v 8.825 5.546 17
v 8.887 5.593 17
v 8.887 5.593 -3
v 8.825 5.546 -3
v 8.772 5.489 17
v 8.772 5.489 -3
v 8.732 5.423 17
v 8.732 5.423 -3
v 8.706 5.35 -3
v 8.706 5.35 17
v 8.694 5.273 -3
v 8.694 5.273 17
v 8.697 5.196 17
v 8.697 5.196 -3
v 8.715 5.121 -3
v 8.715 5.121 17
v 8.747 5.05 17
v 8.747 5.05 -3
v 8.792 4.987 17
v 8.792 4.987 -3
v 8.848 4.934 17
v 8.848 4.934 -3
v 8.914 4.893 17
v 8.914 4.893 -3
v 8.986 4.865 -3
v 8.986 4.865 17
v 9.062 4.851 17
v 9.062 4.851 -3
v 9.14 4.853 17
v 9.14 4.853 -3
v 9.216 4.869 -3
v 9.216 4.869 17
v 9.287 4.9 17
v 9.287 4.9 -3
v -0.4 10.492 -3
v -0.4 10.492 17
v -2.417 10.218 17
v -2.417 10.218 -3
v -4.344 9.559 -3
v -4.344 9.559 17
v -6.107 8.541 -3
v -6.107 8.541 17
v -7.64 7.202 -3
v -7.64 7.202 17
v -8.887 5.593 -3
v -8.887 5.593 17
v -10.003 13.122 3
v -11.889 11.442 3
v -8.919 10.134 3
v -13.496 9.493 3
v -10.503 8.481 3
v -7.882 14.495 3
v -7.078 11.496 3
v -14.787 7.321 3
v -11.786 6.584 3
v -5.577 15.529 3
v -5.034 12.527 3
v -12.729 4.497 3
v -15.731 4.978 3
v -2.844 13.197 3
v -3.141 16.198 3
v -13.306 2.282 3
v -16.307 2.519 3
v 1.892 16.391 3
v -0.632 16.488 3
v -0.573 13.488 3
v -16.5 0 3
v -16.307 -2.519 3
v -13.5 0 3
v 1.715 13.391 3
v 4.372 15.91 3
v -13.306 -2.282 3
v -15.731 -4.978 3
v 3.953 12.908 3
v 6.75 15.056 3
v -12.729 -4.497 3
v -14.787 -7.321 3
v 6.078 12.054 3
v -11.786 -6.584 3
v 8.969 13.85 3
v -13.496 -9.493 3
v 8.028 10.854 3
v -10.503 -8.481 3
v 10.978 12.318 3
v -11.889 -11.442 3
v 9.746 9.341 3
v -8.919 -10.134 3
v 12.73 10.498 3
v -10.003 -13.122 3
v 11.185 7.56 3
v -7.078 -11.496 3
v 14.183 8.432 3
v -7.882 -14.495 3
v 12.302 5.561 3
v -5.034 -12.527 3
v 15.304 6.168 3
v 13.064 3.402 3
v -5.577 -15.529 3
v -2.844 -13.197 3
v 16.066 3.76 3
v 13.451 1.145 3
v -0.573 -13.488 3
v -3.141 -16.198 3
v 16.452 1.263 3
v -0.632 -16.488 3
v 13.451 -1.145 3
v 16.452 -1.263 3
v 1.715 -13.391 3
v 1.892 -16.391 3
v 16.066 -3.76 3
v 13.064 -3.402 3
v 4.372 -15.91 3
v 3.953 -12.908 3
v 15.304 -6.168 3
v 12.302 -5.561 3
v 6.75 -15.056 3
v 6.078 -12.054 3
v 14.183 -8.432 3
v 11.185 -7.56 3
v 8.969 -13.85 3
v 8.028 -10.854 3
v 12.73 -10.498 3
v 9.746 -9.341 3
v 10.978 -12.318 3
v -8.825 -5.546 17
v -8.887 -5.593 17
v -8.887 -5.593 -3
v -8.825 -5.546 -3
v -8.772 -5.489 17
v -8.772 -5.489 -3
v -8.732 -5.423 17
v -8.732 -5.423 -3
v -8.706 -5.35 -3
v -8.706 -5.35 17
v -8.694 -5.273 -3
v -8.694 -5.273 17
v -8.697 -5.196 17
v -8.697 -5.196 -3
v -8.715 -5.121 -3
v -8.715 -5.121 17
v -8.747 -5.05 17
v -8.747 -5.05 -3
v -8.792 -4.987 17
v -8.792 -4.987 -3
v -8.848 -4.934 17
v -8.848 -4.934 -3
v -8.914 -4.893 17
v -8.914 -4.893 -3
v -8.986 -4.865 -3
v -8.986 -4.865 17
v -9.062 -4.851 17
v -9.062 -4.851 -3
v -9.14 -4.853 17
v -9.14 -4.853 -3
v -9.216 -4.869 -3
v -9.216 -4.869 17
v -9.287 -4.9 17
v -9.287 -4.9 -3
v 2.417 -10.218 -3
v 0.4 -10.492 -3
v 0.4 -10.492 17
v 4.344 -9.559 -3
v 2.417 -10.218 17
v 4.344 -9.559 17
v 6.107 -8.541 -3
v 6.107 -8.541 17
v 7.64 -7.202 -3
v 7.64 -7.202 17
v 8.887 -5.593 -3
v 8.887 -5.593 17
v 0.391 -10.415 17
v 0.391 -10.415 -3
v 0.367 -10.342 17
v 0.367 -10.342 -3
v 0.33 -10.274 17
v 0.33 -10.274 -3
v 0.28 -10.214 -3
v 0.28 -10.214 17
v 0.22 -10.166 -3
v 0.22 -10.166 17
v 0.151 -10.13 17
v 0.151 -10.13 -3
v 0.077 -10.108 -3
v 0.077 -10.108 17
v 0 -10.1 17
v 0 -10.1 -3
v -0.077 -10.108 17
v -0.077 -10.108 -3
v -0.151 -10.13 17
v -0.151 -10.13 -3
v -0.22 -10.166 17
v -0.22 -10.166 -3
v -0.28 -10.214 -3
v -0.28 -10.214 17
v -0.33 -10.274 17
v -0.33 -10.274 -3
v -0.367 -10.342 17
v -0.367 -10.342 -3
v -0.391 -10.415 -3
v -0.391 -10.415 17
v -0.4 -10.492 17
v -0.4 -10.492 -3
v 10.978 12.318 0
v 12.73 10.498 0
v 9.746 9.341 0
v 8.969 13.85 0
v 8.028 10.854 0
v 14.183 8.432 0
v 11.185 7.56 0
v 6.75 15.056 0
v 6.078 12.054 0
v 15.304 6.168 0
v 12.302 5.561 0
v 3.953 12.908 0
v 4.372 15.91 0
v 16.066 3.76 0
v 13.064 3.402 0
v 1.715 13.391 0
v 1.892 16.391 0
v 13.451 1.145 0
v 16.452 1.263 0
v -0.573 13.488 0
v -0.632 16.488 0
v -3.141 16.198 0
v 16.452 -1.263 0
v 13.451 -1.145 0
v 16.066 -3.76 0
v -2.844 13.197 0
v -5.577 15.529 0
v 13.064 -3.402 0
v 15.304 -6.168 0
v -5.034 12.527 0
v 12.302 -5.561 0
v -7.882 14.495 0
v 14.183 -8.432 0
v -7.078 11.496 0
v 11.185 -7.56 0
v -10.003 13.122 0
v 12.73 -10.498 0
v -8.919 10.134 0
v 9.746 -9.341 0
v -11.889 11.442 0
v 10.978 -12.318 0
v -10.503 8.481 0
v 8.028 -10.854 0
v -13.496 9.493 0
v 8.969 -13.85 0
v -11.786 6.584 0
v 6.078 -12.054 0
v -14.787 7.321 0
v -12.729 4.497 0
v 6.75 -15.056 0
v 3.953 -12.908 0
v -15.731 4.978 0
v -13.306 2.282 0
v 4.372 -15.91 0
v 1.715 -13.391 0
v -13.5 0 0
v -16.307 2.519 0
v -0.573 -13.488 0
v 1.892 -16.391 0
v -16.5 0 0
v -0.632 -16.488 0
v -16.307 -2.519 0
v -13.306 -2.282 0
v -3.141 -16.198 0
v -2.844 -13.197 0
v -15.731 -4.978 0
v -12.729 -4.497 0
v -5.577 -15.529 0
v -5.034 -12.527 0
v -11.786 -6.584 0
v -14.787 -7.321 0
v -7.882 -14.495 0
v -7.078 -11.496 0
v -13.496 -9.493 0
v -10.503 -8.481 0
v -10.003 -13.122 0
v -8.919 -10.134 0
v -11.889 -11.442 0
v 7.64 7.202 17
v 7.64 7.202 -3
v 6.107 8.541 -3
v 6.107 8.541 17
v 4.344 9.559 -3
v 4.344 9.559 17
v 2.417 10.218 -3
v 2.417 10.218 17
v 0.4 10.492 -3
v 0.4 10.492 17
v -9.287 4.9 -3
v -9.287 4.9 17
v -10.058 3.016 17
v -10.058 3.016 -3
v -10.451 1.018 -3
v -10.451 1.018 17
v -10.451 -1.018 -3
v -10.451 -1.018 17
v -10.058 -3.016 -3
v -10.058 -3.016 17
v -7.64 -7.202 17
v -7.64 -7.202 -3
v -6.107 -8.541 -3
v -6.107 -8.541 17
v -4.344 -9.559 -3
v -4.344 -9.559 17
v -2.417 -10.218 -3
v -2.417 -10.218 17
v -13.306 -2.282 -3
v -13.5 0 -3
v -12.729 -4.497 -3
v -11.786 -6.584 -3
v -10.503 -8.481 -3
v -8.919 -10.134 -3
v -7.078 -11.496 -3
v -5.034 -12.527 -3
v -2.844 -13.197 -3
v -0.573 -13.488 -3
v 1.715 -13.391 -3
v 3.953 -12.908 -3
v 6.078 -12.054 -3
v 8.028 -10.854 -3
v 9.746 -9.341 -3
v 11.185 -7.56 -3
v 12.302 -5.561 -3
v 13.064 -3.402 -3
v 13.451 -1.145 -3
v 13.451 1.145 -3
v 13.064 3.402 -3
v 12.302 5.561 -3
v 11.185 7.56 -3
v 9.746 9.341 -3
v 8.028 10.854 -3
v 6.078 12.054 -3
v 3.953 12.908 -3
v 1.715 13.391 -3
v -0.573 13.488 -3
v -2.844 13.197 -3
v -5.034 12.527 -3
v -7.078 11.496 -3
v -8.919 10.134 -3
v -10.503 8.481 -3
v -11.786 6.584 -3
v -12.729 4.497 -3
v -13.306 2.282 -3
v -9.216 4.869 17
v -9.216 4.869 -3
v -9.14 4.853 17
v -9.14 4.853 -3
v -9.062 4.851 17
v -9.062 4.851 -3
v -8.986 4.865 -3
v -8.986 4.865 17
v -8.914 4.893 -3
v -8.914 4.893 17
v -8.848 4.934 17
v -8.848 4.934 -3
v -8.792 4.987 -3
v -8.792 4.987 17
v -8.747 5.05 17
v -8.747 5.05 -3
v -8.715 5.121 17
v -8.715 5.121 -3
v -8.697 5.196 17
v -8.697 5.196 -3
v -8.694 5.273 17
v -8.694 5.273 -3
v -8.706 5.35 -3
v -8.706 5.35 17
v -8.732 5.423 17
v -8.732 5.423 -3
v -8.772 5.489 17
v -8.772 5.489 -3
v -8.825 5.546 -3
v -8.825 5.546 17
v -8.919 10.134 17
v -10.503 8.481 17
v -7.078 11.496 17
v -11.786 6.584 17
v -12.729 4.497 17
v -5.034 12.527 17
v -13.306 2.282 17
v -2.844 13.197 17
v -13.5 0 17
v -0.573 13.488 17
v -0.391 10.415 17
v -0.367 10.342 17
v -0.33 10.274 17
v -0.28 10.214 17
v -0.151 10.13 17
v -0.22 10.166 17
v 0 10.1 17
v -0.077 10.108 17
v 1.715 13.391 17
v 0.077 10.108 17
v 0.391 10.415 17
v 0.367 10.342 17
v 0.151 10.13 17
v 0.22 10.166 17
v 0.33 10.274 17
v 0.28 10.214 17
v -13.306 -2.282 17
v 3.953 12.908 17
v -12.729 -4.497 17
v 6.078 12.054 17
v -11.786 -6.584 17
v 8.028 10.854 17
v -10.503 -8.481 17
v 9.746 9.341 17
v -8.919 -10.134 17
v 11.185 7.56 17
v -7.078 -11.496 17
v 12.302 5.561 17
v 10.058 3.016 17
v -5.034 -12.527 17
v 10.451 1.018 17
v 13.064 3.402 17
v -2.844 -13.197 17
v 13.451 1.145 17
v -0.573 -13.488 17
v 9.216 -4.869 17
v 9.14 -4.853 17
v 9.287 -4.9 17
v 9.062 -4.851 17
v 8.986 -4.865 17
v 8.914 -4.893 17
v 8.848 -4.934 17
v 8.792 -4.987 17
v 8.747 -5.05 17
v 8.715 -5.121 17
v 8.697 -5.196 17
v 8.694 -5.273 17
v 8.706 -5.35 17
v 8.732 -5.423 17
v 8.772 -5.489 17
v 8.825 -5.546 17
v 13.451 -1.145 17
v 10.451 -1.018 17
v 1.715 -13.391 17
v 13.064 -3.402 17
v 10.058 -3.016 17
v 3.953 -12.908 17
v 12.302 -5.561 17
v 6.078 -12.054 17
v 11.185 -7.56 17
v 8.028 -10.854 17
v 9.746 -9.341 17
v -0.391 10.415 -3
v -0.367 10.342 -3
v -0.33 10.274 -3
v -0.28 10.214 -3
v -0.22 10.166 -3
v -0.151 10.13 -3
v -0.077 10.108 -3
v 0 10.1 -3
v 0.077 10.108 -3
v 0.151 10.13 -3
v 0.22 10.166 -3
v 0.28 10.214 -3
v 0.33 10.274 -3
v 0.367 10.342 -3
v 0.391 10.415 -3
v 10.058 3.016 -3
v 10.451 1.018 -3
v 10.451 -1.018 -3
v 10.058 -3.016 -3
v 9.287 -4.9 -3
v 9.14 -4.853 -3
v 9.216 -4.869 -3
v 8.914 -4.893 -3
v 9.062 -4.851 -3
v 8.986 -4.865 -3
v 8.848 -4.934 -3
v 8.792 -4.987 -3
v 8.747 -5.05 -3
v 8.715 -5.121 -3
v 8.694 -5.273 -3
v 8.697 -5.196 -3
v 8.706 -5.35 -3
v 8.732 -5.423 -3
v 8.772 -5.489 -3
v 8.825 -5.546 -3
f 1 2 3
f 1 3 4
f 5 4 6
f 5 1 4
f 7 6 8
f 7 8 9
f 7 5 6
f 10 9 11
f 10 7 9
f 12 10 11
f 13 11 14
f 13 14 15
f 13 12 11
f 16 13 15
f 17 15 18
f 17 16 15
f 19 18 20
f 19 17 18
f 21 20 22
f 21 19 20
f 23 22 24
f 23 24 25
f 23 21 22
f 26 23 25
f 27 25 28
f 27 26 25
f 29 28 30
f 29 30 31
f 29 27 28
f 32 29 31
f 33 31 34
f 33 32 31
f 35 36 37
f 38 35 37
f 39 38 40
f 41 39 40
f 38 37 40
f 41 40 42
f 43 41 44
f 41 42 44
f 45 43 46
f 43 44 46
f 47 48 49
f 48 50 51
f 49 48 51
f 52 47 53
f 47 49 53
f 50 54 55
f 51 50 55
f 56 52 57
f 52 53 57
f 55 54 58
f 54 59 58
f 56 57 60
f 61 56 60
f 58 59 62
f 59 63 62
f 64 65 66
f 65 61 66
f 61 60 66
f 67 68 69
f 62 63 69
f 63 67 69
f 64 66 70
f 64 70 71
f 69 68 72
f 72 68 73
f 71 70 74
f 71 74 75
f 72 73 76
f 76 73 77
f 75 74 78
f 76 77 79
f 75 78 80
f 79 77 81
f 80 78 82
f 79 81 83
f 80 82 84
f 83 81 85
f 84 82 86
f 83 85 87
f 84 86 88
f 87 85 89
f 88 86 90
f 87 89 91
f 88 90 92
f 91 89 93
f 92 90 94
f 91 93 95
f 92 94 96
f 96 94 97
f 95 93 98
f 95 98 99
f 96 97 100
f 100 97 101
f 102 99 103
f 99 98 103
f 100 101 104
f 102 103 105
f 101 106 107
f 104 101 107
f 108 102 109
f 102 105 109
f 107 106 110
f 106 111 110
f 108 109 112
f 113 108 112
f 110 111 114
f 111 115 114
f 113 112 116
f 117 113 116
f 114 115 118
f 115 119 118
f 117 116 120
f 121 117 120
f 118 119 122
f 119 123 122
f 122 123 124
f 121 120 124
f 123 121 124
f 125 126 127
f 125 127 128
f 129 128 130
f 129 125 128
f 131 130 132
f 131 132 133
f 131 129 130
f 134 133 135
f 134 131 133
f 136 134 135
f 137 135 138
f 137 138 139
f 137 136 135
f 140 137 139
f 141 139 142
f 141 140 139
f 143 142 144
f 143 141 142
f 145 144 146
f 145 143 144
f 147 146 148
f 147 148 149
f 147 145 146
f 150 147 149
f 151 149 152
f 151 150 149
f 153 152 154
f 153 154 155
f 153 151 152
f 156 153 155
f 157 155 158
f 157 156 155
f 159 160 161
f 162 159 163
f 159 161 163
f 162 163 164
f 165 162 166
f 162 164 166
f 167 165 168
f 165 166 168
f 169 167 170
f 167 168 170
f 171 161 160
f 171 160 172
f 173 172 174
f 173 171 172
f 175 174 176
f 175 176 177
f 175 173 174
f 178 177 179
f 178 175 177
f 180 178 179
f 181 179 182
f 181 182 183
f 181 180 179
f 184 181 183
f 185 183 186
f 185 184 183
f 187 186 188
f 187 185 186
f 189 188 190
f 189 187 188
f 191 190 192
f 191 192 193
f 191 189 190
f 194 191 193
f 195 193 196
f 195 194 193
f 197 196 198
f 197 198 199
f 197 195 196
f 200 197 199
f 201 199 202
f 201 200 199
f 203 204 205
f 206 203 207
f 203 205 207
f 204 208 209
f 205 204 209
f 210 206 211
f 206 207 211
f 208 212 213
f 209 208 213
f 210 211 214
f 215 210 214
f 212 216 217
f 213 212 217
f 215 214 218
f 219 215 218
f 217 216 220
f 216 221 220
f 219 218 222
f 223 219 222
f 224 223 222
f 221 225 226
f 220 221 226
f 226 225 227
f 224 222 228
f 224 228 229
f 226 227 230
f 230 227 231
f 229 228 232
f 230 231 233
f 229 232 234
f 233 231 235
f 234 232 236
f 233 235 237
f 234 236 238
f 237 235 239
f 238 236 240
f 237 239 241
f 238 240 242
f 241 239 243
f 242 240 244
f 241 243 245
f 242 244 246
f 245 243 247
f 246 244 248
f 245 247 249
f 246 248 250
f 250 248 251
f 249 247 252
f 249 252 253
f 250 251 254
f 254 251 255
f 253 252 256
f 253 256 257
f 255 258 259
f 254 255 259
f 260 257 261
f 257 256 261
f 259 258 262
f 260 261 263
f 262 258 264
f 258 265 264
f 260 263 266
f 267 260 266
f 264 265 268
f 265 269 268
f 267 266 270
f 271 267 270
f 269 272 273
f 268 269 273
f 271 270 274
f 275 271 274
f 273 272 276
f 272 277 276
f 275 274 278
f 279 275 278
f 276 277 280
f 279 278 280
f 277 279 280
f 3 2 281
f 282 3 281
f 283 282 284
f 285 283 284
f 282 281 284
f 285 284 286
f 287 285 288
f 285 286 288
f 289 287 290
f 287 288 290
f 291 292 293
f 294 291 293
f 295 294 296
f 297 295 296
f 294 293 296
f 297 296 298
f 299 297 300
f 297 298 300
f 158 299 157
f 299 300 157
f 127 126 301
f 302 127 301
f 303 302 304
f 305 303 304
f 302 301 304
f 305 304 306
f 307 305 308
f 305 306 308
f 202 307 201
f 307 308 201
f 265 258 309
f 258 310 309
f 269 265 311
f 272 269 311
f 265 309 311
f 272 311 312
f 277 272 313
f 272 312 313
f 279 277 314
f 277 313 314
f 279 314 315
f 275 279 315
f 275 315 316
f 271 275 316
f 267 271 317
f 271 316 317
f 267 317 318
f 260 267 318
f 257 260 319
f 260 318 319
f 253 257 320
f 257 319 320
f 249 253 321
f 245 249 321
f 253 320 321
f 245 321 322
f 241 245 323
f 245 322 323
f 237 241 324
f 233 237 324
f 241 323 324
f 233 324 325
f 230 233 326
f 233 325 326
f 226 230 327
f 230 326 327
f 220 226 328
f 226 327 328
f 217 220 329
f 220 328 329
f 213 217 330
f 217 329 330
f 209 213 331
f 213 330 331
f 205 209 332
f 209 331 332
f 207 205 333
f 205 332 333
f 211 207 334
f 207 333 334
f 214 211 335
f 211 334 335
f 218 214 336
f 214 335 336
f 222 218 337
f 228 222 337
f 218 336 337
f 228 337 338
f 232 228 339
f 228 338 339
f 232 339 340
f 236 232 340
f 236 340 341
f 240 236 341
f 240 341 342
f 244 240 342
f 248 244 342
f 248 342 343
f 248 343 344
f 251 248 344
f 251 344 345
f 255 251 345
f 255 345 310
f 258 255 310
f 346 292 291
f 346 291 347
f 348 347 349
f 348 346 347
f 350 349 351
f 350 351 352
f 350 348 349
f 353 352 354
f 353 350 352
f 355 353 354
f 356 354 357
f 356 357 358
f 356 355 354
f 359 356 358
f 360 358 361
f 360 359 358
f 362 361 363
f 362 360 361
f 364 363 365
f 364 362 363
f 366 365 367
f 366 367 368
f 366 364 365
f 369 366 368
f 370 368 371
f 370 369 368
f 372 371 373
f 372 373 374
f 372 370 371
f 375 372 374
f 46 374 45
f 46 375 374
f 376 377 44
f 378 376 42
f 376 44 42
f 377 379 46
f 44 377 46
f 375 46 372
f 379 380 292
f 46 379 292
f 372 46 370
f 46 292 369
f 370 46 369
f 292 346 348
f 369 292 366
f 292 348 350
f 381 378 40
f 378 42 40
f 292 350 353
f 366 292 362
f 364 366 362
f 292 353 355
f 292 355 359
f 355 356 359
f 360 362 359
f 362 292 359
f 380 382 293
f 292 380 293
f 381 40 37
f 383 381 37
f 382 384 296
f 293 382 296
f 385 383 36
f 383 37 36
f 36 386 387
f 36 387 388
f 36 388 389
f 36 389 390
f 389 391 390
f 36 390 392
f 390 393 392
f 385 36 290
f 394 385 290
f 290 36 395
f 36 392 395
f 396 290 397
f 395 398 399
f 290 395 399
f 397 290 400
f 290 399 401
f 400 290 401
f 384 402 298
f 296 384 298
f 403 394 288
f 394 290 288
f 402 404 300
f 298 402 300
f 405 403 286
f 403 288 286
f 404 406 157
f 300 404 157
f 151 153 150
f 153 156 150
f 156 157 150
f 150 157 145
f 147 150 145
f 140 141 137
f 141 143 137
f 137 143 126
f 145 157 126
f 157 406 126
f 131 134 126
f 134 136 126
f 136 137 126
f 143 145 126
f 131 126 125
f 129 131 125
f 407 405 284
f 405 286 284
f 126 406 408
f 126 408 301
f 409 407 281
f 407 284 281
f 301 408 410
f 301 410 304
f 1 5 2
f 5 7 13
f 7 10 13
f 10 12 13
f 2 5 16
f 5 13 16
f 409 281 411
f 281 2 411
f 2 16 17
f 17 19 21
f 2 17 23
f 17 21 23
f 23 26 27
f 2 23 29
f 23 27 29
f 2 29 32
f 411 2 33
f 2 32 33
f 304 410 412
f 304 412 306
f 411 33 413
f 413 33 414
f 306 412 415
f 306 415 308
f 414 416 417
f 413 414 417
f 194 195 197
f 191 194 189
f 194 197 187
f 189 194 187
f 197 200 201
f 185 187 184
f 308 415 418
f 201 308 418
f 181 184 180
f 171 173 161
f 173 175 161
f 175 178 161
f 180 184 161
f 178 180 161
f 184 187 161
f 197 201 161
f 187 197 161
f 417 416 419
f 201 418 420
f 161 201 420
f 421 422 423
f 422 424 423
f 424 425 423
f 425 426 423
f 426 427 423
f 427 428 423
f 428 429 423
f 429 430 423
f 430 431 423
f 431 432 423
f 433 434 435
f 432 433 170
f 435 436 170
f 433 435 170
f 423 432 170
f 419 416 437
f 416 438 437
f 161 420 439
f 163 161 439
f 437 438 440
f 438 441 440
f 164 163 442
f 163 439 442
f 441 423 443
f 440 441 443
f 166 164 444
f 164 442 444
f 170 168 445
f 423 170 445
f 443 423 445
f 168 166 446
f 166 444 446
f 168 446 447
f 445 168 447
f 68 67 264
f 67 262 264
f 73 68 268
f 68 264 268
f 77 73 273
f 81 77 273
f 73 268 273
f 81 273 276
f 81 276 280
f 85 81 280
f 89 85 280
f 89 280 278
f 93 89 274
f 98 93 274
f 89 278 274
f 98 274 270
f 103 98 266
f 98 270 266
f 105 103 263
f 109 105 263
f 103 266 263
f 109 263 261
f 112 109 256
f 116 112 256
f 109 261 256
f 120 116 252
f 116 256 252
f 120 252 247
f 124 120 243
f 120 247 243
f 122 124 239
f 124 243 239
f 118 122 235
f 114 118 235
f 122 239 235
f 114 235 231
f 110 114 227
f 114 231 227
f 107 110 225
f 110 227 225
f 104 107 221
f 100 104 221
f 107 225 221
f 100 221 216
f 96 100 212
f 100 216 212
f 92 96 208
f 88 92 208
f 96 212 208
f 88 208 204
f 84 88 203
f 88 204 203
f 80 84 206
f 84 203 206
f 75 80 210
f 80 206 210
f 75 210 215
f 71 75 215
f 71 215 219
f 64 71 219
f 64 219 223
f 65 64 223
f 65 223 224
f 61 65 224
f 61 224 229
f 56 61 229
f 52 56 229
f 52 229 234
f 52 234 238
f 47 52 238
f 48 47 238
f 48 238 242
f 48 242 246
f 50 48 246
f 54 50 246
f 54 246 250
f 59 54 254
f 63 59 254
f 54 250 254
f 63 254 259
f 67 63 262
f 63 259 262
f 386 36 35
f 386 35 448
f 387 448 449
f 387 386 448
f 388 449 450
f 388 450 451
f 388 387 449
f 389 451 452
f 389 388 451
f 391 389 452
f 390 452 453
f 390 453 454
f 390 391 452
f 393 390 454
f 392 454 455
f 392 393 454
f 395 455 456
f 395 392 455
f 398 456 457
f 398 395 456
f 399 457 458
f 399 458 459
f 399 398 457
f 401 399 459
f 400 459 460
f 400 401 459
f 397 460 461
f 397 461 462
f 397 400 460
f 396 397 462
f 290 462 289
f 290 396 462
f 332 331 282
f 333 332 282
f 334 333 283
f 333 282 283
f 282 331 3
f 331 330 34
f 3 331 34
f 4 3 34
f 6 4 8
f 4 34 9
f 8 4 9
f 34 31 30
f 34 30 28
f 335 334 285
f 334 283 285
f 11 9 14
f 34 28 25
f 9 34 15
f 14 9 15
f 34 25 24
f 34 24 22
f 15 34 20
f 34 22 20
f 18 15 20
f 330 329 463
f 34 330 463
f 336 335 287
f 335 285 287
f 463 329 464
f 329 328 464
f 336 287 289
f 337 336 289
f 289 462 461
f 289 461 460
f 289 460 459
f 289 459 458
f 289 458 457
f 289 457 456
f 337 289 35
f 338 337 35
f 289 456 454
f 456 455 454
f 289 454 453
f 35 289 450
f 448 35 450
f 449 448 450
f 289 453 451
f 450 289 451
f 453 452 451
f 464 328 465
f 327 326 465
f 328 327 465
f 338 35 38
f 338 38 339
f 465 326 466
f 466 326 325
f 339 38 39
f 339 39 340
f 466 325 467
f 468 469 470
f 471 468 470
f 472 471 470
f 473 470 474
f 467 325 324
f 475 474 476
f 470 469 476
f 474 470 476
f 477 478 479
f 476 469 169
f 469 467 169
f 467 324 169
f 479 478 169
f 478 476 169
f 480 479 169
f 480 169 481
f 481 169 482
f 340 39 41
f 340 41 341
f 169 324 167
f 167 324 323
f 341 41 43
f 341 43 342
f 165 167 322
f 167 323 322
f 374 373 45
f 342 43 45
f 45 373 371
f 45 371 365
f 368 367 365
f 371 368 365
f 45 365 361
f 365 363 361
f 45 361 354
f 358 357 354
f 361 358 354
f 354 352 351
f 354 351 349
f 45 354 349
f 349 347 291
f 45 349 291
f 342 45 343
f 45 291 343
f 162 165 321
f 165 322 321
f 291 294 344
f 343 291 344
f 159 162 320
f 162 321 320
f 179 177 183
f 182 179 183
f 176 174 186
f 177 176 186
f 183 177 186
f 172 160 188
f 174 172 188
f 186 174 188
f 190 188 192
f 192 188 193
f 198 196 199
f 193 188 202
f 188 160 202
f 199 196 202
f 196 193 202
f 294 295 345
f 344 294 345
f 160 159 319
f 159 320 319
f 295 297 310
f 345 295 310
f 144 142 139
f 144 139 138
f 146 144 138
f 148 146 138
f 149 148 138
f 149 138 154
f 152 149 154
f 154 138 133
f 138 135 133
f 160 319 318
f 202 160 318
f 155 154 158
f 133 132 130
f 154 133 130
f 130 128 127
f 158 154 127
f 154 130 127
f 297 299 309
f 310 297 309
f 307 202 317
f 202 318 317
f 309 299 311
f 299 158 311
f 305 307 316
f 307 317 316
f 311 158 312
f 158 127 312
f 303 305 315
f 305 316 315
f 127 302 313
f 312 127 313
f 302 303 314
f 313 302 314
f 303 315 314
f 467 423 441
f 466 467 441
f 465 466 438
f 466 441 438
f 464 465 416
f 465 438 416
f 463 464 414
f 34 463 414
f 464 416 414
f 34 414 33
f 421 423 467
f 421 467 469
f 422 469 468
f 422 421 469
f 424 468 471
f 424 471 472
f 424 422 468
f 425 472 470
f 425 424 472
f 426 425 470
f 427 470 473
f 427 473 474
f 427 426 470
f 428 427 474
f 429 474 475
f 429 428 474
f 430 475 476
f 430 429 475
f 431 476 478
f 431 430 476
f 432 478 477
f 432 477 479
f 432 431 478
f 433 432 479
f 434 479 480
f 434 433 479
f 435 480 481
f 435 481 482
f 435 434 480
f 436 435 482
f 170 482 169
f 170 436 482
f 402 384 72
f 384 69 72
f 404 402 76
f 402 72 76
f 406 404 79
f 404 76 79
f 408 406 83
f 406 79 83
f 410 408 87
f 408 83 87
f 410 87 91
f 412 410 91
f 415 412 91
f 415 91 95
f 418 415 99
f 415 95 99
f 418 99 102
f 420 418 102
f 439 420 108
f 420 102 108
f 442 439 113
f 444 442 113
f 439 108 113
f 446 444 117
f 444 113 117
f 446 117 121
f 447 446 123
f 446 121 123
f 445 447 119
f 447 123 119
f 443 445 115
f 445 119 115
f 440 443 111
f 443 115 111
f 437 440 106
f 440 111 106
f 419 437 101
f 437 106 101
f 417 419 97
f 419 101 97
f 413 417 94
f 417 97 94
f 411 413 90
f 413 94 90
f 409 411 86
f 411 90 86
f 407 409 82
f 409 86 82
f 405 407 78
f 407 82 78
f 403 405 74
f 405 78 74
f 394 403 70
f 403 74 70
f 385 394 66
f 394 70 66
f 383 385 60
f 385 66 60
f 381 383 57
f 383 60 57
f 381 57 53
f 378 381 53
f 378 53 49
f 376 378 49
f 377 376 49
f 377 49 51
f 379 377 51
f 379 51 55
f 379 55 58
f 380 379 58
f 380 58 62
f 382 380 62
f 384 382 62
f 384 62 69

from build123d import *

# Parameters (mm, degrees)
F3_DEPTH        = 20
F3_COPIES_COUNT = 6


# Not quite as in the source:
# - a pattern or mirror of a feature is missing from the dataset's text; its kind, count and spacing are read off the source's solid


with BuildPart() as f1:
    # F0 (on Front) → F1 (revolve)
    with BuildSketch(Plane.XZ):
        Polygon((-13.5, -3), (-10.5, -3), (-10.5, 17), (-13.5, 17), (-13.5, 3), (-16.5, 3), (-16.5, 0), (-13.5, 0), align=None)
    revolve(axis=Axis((0, 0, 29.5368466722), (0, 0, 1)))

    # F2 (on face) → F3 (join, through all)
    with BuildSketch(Plane.XY.offset(17)):
        with BuildLine():
            ThreePointArc((0.3999274311, 10.4923809524), (0, 10.5), (-0.3999274311, 10.4923809524))
            ThreePointArc((-0.3999274311, 10.4923809524), (0, 10.1), (0.3999274311, 10.4923809524))
        make_face()
    f3 = extrude(amount=-F3_DEPTH)

    # F3_copies: F3 ×6 about axis
    f3_copies_axis = Axis((0, 0, 0), (0, 0, 1))
    for i in range(1, F3_COPIES_COUNT):
        add(f3.rotate(f3_copies_axis, i * 360 / F3_COPIES_COUNT))


solid = f1.part
